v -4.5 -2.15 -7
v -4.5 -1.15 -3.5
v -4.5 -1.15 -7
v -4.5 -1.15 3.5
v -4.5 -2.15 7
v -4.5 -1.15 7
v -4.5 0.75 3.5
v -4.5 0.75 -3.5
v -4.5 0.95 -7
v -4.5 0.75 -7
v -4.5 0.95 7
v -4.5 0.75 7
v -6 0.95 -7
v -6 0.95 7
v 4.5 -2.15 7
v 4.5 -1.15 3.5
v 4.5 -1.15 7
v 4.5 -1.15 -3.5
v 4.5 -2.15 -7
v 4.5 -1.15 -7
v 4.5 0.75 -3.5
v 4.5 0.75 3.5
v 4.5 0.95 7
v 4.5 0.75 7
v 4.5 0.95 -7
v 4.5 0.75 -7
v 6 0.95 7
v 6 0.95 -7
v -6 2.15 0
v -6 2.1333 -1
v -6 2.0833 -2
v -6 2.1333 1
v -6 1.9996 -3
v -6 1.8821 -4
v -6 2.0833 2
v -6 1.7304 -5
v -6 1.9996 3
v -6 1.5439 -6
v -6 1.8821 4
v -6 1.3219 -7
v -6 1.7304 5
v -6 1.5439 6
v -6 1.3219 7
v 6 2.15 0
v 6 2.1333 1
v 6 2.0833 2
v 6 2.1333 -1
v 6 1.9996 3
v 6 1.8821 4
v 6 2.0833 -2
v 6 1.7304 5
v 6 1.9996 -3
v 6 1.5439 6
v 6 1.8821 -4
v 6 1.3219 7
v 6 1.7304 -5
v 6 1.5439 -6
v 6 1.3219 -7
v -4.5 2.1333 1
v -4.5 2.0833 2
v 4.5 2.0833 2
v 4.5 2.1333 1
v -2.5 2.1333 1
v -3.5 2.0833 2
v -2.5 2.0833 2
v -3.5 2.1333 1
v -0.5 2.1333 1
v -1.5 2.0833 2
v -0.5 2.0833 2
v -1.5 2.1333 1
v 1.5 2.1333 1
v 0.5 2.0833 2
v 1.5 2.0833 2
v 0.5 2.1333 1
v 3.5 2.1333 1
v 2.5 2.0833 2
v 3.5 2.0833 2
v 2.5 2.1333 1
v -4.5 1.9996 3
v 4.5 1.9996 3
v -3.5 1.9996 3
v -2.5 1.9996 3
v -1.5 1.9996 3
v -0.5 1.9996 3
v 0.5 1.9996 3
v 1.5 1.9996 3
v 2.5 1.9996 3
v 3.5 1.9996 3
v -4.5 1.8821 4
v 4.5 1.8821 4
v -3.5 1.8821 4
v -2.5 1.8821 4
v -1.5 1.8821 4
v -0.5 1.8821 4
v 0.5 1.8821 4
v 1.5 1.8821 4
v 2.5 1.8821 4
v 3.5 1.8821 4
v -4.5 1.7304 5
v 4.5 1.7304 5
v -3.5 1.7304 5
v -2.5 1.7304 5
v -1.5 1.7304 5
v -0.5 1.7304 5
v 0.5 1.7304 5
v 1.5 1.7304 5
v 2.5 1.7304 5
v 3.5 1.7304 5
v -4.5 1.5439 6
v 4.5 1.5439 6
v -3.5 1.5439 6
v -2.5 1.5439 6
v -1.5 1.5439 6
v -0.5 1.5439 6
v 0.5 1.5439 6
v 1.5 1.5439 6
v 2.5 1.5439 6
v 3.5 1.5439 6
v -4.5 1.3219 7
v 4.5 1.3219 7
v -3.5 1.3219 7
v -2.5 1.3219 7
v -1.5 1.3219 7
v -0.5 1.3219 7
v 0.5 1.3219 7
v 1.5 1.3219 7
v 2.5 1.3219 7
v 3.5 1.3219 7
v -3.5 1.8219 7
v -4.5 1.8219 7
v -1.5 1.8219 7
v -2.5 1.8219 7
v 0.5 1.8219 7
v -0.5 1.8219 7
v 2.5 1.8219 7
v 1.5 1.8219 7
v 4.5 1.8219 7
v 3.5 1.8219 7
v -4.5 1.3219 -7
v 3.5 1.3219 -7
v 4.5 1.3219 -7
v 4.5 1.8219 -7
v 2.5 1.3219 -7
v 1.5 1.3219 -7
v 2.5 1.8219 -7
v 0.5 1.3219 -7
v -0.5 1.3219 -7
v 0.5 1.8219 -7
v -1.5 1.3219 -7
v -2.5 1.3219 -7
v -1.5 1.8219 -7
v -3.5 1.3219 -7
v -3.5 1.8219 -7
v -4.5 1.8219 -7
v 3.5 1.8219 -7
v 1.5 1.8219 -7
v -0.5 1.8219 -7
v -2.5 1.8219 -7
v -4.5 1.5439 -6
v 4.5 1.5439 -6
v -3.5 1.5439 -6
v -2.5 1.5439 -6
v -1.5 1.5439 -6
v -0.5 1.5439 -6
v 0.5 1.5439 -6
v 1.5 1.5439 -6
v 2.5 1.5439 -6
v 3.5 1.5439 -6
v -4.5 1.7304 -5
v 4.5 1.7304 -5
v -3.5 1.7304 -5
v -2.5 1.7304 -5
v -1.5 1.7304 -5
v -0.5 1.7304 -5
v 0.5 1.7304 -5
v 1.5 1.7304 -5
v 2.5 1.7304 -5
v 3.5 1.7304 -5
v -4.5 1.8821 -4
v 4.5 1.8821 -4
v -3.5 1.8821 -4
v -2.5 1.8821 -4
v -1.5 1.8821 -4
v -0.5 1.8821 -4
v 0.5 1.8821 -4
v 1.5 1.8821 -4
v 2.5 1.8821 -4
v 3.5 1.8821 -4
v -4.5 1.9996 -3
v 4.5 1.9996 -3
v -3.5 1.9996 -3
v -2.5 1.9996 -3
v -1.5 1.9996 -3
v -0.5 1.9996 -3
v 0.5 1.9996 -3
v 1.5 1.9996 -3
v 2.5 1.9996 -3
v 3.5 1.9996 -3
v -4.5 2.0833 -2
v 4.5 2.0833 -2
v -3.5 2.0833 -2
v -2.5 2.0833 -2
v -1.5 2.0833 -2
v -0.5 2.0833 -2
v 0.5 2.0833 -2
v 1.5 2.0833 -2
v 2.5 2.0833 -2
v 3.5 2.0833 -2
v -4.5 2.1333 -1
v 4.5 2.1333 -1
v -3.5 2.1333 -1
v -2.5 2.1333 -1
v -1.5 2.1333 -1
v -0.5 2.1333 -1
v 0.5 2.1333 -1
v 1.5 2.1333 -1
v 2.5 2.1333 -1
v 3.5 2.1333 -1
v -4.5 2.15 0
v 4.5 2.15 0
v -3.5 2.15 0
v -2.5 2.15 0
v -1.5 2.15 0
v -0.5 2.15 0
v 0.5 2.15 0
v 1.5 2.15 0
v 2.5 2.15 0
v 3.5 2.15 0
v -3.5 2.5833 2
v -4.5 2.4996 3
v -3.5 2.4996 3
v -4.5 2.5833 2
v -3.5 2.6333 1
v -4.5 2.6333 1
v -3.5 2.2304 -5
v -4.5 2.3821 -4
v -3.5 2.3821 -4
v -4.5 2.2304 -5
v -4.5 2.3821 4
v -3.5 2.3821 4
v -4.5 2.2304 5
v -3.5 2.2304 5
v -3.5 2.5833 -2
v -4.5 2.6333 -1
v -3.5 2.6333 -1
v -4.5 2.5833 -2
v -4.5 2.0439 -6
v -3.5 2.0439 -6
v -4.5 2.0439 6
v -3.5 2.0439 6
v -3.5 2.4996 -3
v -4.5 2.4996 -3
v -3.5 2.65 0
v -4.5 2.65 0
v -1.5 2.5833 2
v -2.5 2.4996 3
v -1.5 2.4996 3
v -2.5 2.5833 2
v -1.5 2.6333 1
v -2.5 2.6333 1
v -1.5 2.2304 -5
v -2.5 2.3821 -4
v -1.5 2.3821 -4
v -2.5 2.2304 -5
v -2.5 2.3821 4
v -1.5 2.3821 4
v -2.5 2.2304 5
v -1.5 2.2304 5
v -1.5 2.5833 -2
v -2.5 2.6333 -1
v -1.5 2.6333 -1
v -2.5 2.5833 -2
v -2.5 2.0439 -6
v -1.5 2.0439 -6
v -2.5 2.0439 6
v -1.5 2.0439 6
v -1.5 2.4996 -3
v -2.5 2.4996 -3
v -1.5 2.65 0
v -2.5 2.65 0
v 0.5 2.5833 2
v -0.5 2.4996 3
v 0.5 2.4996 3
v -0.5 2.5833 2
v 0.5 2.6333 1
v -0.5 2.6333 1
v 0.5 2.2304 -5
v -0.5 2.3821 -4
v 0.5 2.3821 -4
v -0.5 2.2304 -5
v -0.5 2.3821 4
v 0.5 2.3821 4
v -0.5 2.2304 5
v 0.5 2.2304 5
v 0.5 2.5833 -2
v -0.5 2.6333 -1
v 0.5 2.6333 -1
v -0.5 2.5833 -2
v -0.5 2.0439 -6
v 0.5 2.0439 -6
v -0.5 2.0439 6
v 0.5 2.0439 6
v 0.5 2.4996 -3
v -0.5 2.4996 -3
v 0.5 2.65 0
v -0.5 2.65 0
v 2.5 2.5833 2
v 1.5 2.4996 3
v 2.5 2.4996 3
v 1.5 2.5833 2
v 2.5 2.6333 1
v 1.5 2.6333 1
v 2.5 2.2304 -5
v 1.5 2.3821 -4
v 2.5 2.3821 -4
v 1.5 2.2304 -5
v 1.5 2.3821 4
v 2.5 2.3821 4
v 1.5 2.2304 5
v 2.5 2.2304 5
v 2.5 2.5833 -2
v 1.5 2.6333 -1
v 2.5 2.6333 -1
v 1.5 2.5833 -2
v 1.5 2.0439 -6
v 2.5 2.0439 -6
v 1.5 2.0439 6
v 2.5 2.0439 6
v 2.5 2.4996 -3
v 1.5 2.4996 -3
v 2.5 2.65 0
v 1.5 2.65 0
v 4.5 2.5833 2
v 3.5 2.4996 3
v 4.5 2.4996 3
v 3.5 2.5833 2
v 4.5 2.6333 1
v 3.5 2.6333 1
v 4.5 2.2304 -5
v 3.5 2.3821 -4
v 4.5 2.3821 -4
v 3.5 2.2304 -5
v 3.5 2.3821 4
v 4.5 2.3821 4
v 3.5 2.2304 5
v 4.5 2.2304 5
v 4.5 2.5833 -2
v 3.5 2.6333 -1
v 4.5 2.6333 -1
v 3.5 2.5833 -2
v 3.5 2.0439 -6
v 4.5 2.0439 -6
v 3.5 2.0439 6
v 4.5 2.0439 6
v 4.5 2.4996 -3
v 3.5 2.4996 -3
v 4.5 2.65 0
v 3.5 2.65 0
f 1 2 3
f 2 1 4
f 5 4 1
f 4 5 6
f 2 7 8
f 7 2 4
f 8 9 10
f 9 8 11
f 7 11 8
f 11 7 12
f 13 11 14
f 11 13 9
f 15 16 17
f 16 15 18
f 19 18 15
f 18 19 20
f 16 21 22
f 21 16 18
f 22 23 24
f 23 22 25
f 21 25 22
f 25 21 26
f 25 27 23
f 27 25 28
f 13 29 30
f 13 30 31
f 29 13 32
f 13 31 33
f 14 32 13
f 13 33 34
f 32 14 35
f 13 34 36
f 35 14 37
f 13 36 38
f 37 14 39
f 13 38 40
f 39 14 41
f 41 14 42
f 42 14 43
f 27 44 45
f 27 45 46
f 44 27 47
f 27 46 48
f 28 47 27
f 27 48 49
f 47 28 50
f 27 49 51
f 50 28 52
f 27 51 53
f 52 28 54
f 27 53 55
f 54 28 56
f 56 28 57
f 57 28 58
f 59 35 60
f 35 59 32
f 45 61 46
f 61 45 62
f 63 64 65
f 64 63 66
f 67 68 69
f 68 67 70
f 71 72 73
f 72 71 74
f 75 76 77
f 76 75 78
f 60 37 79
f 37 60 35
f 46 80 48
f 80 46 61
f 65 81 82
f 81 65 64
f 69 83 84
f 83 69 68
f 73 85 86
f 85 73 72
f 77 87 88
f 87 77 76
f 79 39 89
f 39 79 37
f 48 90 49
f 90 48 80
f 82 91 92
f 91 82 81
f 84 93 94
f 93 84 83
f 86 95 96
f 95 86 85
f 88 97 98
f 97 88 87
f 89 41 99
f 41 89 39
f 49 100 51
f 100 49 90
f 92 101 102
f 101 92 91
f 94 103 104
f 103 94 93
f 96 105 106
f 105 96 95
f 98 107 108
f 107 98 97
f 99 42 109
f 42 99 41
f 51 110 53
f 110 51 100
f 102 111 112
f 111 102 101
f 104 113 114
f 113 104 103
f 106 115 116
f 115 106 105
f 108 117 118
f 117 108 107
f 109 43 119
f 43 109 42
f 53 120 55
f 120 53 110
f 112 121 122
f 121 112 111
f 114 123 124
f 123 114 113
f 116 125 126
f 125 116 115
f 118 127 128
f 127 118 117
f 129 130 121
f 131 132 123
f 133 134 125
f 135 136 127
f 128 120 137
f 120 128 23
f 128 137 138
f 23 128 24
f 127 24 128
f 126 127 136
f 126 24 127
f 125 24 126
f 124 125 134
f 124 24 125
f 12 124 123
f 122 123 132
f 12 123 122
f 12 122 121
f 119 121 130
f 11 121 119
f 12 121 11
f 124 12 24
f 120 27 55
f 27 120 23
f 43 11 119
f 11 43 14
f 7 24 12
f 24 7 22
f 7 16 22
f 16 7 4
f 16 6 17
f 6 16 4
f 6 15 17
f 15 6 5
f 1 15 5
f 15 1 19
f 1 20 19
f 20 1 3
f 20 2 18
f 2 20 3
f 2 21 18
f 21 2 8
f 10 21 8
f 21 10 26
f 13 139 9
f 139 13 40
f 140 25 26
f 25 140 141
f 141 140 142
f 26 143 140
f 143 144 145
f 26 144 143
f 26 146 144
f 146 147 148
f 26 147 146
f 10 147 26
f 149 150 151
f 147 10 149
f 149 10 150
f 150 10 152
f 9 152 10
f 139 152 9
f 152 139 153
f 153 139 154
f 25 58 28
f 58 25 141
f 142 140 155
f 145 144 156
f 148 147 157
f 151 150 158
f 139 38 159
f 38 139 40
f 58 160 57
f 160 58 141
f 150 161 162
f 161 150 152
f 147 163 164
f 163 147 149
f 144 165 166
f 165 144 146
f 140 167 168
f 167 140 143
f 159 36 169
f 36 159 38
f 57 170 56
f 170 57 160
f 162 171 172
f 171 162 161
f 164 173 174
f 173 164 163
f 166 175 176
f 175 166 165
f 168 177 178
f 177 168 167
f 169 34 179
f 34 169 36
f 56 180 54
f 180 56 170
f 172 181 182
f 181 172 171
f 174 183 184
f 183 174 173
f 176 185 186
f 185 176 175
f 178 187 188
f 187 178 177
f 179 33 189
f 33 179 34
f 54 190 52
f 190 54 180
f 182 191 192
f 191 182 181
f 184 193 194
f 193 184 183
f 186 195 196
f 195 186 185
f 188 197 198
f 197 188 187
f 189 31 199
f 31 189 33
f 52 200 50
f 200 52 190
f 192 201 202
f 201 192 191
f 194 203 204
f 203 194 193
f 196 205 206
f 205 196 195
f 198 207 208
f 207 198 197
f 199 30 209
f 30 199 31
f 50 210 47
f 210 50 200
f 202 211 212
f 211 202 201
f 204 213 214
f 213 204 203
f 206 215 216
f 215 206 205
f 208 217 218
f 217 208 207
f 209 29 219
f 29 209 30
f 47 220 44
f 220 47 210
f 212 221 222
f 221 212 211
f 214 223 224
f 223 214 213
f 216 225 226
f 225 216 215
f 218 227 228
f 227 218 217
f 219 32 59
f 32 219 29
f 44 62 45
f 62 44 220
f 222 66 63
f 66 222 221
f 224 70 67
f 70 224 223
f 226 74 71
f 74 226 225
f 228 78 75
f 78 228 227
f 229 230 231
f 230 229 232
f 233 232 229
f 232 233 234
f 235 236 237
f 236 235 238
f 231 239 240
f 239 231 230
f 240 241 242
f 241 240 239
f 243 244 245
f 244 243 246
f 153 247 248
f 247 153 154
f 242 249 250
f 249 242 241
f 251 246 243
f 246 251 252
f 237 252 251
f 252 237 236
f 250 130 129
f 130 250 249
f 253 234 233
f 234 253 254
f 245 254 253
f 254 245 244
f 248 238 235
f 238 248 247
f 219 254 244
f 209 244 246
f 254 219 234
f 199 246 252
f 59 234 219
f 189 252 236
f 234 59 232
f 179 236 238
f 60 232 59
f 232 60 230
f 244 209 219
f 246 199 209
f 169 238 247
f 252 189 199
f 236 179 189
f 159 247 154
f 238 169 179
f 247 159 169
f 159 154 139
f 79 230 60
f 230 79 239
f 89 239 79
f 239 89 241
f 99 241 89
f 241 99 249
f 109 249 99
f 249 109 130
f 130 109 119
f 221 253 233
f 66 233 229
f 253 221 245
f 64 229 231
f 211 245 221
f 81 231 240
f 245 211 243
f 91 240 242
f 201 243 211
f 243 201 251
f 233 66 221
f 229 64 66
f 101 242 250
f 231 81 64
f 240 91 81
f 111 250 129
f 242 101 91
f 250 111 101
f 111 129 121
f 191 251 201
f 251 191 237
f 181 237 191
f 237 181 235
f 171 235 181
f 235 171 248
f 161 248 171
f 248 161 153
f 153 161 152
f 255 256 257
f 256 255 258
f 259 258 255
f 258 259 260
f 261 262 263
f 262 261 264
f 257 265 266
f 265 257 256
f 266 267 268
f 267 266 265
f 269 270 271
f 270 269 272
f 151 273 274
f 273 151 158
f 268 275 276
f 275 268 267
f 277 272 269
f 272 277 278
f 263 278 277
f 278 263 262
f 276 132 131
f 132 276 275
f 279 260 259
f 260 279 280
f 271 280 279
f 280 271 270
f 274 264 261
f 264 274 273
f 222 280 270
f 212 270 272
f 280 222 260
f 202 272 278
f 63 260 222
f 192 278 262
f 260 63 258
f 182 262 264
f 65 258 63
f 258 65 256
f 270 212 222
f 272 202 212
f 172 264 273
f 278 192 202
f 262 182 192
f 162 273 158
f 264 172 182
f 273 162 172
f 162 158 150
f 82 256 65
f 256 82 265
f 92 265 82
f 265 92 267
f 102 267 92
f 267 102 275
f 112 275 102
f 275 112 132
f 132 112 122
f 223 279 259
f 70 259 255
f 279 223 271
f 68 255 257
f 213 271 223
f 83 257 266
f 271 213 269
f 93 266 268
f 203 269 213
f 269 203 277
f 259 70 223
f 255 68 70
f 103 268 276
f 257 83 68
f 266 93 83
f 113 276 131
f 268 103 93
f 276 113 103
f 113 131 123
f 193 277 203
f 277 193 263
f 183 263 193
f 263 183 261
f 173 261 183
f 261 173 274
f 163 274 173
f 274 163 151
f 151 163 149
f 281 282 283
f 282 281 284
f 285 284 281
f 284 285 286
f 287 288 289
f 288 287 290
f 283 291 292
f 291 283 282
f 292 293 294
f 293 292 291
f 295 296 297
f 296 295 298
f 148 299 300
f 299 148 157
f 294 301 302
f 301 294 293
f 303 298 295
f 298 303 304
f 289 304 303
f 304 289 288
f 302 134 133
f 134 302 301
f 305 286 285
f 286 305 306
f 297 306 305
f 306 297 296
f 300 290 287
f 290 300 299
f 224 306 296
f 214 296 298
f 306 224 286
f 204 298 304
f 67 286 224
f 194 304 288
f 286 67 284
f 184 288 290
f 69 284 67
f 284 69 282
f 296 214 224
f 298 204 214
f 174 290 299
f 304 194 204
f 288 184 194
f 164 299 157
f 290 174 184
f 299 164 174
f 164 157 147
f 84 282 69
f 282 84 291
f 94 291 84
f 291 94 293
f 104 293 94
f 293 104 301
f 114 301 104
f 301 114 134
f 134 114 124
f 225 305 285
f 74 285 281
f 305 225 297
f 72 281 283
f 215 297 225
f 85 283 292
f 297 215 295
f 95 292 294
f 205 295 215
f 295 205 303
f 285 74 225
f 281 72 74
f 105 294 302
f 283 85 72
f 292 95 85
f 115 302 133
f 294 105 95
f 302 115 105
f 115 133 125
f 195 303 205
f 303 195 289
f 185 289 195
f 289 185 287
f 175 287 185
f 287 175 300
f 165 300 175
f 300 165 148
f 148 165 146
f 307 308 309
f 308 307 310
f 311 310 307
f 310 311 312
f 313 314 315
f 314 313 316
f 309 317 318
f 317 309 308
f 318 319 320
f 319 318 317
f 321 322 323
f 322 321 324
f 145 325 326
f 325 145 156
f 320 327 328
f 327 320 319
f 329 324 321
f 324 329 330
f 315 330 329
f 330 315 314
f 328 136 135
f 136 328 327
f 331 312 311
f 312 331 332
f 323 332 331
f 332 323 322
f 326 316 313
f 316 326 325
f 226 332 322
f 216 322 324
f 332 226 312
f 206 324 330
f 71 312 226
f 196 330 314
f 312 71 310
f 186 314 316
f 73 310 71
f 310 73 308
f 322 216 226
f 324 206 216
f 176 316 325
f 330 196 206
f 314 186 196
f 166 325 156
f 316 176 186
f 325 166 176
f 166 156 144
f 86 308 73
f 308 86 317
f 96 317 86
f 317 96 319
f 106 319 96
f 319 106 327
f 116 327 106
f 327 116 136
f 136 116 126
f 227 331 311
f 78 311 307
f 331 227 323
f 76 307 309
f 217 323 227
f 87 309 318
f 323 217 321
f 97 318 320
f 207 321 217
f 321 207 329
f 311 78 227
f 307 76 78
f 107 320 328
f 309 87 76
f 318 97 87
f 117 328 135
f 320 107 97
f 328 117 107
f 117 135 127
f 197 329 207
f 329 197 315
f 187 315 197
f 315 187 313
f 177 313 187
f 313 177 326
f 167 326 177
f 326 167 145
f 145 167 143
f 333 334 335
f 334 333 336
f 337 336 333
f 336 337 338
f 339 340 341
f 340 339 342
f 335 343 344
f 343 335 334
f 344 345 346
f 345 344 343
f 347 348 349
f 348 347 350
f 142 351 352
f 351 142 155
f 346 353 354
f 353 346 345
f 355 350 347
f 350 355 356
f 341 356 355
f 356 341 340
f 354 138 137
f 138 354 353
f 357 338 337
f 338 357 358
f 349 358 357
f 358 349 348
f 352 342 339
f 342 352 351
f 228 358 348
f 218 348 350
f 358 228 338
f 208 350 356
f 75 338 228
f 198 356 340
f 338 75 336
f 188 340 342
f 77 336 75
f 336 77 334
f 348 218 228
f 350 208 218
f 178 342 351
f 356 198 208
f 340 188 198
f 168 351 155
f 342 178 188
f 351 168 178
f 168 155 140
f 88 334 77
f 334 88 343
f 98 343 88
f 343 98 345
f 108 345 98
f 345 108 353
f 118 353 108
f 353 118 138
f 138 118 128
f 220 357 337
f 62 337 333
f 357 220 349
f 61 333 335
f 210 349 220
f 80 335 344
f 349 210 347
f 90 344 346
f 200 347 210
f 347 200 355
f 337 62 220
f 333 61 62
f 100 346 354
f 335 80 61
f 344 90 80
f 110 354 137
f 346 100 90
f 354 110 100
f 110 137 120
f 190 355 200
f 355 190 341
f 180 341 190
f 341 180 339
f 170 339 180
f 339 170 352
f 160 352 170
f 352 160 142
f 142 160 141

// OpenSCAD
// file: Dimensions.scad
overlap=0.006;
$fn=300;

screwHoleInnerDiameter=2.5;
screwHoleOuterDiameter=3.0;

shaftBaseHeight=1;
capBaseHeight=shaftBaseHeight;

shaftBaseDiameter=60-10;
//-----------------------
basePlateThickness=1;
ringHeight=12;


coverRingBaseHeight=1;



ringOuterDiameter=60;
ringInnerDiameter=47;
baseRingHeight=7;
capNotchHeight=2.5;

axeDiameter=10;



springDiameter=7;
springThickness=1.5-0.1+0.1;
springDeltaX=-6.7+2.7;
springAngle=37-4;

ringOuterSpringDiameter=47;
ringSpringDiameter1=ringOuterSpringDiameter-4;
ringSpringDiameter2=ringSpringDiameter1-5;


clickRingNotchDeltaX=-0.1;
clickRingZSpace=0.4;

clickRingThickness=1.5;
clickRingOuterDiameter=30;
clickRingInnerDiameter=clickRingOuterDiameter-clickRingThickness*2;

notchRadius=6;

notchDeltaX=1.6;


capRingHeight=baseRingHeight;


shaftLength=shaftBaseHeight+
    coverRingBaseHeight+
    ringHeight*6+
//    capBaseHeight+
    coverRingBaseHeight+
    0;

//shaftDiameter=9.5;
// main file
include <Dimensions.scad>

overlap=0.006;

frontX=14;
frontY=1.4;
frontZ=12;
middleX=7;
middleY=1.7+0.2;
backX=12+2;
backY=1;
middleAndBackZ=9.0;

gripX=frontX;

gripHeight=1;

tileY=frontY+middleY+backY;


tileWithGrip();


function getTileX()=frontX;
function getTileY()=tileY;

module tileWithGrip(){
    rotate([0,90,0])
    {
        difference()
        {
            tile();
        
            union()
            {
                translate([0,-5+middleY/2,-5-middleAndBackZ/2])
                cube([frontX+overlap,10,10],center=true);
                translate([0,-5+middleY/2,5+middleAndBackZ/2])
                cube([frontX+overlap,10,10],center=true);
            }
        }
        
        for(x=[-4:2:4]){
            color("green")
            translate([0,gripHeight/2,x])
            grip();
        }
    }
}

module tile(delta=0){
    translate([0,tileY/2,0])
    rotate([0,0,180])
    linear_extrude(height=frontZ+delta, center=true, convexity=10, twist=0)
    polygon(points=[
        [-frontX/2/7*7-delta,-delta+calcDeltaH(frontX/2/7*7)],
        [-frontX/2/7*6-delta,-delta+calcDeltaH(frontX/2/7*6)],
        [-frontX/2/7*5-delta,-delta+calcDeltaH(frontX/2/7*5)],
        [-frontX/2/7*4-delta,-delta+calcDeltaH(frontX/2/7*4)],
        [-frontX/2/7*3-delta,-delta+calcDeltaH(frontX/2/7*3)],
        [-frontX/2/7*2-delta,-delta+calcDeltaH(frontX/2/7*2)],
        [-frontX/2/7*1-delta,-delta+calcDeltaH(frontX/2/7*1)],
        [0,0-delta],
        [frontX/2/7*1+delta,-delta+calcDeltaH(frontX/2/7*1)],
        [frontX/2/7*2+delta,-delta+calcDeltaH(frontX/2/7*2)],
        [frontX/2/7*3+delta,-delta+calcDeltaH(frontX/2/7*3)],
        [frontX/2/7*4+delta,-delta+calcDeltaH(frontX/2/7*4)],
        [frontX/2/7*5+delta,-delta+calcDeltaH(frontX/2/7*5)],
        [frontX/2/7*6+delta,-delta+calcDeltaH(frontX/2/7*6)],
        [frontX/2/7*7+delta,-delta+calcDeltaH(frontX/2/7*7)],
        [frontX/2+delta,delta],
        [frontX/2+delta,frontY+delta],
        [middleX/2+delta,frontY+delta],
        [middleX/2+delta,frontY-delta+middleY],
        [backX/2+delta,frontY+middleY-delta],
        [backX/2+delta,frontY+middleY+backY+delta],
        [-backX/2-delta,frontY+middleY+backY+delta],
        [-backX/2-delta,frontY+middleY-delta],
        [-middleX/2-delta,frontY+middleY-delta],
        [-middleX/2-delta,frontY+delta],
        [-frontX/2-delta,frontY+delta]]);
}

module grip(){
    translate([0,tileY/2,0])
    rotate([0,0,180])
    linear_extrude(height = gripHeight, center = true, convexity = 10, twist = 0)
    polygon(points=[
        [-gripX/2/7*7,calcDeltaH(gripX/2/7*7)],
        [-gripX/2/7*6,calcDeltaH(gripX/2/7*6)],
        [-gripX/2/7*5,calcDeltaH(gripX/2/7*5)],
        [-gripX/2/7*4,calcDeltaH(gripX/2/7*4)],
        [-gripX/2/7*3,calcDeltaH(gripX/2/7*3)],
        [-gripX/2/7*2,calcDeltaH(gripX/2/7*2)],
        [-gripX/2/7*1,calcDeltaH(gripX/2/7*1)],
        [0,0],
        [gripX/2/7*1,calcDeltaH(gripX/2/7*1)],
        [gripX/2/7*2,calcDeltaH(gripX/2/7*2)],
        [gripX/2/7*3,calcDeltaH(gripX/2/7*3)],
        [gripX/2/7*4,calcDeltaH(gripX/2/7*4)],
        [gripX/2/7*5,calcDeltaH(gripX/2/7*5)],
        [gripX/2/7*6,calcDeltaH(gripX/2/7*6)],
        [gripX/2/7*7,calcDeltaH(gripX/2/7*7)],
        [gripX/2,0],
        [gripX/2,frontY],
        [-gripX/2,frontY]]);
}

function calcDeltaH(x)=ringOuterDiameter/2-sqrt(pow(ringOuterDiameter/2,2)-pow(x,2));
